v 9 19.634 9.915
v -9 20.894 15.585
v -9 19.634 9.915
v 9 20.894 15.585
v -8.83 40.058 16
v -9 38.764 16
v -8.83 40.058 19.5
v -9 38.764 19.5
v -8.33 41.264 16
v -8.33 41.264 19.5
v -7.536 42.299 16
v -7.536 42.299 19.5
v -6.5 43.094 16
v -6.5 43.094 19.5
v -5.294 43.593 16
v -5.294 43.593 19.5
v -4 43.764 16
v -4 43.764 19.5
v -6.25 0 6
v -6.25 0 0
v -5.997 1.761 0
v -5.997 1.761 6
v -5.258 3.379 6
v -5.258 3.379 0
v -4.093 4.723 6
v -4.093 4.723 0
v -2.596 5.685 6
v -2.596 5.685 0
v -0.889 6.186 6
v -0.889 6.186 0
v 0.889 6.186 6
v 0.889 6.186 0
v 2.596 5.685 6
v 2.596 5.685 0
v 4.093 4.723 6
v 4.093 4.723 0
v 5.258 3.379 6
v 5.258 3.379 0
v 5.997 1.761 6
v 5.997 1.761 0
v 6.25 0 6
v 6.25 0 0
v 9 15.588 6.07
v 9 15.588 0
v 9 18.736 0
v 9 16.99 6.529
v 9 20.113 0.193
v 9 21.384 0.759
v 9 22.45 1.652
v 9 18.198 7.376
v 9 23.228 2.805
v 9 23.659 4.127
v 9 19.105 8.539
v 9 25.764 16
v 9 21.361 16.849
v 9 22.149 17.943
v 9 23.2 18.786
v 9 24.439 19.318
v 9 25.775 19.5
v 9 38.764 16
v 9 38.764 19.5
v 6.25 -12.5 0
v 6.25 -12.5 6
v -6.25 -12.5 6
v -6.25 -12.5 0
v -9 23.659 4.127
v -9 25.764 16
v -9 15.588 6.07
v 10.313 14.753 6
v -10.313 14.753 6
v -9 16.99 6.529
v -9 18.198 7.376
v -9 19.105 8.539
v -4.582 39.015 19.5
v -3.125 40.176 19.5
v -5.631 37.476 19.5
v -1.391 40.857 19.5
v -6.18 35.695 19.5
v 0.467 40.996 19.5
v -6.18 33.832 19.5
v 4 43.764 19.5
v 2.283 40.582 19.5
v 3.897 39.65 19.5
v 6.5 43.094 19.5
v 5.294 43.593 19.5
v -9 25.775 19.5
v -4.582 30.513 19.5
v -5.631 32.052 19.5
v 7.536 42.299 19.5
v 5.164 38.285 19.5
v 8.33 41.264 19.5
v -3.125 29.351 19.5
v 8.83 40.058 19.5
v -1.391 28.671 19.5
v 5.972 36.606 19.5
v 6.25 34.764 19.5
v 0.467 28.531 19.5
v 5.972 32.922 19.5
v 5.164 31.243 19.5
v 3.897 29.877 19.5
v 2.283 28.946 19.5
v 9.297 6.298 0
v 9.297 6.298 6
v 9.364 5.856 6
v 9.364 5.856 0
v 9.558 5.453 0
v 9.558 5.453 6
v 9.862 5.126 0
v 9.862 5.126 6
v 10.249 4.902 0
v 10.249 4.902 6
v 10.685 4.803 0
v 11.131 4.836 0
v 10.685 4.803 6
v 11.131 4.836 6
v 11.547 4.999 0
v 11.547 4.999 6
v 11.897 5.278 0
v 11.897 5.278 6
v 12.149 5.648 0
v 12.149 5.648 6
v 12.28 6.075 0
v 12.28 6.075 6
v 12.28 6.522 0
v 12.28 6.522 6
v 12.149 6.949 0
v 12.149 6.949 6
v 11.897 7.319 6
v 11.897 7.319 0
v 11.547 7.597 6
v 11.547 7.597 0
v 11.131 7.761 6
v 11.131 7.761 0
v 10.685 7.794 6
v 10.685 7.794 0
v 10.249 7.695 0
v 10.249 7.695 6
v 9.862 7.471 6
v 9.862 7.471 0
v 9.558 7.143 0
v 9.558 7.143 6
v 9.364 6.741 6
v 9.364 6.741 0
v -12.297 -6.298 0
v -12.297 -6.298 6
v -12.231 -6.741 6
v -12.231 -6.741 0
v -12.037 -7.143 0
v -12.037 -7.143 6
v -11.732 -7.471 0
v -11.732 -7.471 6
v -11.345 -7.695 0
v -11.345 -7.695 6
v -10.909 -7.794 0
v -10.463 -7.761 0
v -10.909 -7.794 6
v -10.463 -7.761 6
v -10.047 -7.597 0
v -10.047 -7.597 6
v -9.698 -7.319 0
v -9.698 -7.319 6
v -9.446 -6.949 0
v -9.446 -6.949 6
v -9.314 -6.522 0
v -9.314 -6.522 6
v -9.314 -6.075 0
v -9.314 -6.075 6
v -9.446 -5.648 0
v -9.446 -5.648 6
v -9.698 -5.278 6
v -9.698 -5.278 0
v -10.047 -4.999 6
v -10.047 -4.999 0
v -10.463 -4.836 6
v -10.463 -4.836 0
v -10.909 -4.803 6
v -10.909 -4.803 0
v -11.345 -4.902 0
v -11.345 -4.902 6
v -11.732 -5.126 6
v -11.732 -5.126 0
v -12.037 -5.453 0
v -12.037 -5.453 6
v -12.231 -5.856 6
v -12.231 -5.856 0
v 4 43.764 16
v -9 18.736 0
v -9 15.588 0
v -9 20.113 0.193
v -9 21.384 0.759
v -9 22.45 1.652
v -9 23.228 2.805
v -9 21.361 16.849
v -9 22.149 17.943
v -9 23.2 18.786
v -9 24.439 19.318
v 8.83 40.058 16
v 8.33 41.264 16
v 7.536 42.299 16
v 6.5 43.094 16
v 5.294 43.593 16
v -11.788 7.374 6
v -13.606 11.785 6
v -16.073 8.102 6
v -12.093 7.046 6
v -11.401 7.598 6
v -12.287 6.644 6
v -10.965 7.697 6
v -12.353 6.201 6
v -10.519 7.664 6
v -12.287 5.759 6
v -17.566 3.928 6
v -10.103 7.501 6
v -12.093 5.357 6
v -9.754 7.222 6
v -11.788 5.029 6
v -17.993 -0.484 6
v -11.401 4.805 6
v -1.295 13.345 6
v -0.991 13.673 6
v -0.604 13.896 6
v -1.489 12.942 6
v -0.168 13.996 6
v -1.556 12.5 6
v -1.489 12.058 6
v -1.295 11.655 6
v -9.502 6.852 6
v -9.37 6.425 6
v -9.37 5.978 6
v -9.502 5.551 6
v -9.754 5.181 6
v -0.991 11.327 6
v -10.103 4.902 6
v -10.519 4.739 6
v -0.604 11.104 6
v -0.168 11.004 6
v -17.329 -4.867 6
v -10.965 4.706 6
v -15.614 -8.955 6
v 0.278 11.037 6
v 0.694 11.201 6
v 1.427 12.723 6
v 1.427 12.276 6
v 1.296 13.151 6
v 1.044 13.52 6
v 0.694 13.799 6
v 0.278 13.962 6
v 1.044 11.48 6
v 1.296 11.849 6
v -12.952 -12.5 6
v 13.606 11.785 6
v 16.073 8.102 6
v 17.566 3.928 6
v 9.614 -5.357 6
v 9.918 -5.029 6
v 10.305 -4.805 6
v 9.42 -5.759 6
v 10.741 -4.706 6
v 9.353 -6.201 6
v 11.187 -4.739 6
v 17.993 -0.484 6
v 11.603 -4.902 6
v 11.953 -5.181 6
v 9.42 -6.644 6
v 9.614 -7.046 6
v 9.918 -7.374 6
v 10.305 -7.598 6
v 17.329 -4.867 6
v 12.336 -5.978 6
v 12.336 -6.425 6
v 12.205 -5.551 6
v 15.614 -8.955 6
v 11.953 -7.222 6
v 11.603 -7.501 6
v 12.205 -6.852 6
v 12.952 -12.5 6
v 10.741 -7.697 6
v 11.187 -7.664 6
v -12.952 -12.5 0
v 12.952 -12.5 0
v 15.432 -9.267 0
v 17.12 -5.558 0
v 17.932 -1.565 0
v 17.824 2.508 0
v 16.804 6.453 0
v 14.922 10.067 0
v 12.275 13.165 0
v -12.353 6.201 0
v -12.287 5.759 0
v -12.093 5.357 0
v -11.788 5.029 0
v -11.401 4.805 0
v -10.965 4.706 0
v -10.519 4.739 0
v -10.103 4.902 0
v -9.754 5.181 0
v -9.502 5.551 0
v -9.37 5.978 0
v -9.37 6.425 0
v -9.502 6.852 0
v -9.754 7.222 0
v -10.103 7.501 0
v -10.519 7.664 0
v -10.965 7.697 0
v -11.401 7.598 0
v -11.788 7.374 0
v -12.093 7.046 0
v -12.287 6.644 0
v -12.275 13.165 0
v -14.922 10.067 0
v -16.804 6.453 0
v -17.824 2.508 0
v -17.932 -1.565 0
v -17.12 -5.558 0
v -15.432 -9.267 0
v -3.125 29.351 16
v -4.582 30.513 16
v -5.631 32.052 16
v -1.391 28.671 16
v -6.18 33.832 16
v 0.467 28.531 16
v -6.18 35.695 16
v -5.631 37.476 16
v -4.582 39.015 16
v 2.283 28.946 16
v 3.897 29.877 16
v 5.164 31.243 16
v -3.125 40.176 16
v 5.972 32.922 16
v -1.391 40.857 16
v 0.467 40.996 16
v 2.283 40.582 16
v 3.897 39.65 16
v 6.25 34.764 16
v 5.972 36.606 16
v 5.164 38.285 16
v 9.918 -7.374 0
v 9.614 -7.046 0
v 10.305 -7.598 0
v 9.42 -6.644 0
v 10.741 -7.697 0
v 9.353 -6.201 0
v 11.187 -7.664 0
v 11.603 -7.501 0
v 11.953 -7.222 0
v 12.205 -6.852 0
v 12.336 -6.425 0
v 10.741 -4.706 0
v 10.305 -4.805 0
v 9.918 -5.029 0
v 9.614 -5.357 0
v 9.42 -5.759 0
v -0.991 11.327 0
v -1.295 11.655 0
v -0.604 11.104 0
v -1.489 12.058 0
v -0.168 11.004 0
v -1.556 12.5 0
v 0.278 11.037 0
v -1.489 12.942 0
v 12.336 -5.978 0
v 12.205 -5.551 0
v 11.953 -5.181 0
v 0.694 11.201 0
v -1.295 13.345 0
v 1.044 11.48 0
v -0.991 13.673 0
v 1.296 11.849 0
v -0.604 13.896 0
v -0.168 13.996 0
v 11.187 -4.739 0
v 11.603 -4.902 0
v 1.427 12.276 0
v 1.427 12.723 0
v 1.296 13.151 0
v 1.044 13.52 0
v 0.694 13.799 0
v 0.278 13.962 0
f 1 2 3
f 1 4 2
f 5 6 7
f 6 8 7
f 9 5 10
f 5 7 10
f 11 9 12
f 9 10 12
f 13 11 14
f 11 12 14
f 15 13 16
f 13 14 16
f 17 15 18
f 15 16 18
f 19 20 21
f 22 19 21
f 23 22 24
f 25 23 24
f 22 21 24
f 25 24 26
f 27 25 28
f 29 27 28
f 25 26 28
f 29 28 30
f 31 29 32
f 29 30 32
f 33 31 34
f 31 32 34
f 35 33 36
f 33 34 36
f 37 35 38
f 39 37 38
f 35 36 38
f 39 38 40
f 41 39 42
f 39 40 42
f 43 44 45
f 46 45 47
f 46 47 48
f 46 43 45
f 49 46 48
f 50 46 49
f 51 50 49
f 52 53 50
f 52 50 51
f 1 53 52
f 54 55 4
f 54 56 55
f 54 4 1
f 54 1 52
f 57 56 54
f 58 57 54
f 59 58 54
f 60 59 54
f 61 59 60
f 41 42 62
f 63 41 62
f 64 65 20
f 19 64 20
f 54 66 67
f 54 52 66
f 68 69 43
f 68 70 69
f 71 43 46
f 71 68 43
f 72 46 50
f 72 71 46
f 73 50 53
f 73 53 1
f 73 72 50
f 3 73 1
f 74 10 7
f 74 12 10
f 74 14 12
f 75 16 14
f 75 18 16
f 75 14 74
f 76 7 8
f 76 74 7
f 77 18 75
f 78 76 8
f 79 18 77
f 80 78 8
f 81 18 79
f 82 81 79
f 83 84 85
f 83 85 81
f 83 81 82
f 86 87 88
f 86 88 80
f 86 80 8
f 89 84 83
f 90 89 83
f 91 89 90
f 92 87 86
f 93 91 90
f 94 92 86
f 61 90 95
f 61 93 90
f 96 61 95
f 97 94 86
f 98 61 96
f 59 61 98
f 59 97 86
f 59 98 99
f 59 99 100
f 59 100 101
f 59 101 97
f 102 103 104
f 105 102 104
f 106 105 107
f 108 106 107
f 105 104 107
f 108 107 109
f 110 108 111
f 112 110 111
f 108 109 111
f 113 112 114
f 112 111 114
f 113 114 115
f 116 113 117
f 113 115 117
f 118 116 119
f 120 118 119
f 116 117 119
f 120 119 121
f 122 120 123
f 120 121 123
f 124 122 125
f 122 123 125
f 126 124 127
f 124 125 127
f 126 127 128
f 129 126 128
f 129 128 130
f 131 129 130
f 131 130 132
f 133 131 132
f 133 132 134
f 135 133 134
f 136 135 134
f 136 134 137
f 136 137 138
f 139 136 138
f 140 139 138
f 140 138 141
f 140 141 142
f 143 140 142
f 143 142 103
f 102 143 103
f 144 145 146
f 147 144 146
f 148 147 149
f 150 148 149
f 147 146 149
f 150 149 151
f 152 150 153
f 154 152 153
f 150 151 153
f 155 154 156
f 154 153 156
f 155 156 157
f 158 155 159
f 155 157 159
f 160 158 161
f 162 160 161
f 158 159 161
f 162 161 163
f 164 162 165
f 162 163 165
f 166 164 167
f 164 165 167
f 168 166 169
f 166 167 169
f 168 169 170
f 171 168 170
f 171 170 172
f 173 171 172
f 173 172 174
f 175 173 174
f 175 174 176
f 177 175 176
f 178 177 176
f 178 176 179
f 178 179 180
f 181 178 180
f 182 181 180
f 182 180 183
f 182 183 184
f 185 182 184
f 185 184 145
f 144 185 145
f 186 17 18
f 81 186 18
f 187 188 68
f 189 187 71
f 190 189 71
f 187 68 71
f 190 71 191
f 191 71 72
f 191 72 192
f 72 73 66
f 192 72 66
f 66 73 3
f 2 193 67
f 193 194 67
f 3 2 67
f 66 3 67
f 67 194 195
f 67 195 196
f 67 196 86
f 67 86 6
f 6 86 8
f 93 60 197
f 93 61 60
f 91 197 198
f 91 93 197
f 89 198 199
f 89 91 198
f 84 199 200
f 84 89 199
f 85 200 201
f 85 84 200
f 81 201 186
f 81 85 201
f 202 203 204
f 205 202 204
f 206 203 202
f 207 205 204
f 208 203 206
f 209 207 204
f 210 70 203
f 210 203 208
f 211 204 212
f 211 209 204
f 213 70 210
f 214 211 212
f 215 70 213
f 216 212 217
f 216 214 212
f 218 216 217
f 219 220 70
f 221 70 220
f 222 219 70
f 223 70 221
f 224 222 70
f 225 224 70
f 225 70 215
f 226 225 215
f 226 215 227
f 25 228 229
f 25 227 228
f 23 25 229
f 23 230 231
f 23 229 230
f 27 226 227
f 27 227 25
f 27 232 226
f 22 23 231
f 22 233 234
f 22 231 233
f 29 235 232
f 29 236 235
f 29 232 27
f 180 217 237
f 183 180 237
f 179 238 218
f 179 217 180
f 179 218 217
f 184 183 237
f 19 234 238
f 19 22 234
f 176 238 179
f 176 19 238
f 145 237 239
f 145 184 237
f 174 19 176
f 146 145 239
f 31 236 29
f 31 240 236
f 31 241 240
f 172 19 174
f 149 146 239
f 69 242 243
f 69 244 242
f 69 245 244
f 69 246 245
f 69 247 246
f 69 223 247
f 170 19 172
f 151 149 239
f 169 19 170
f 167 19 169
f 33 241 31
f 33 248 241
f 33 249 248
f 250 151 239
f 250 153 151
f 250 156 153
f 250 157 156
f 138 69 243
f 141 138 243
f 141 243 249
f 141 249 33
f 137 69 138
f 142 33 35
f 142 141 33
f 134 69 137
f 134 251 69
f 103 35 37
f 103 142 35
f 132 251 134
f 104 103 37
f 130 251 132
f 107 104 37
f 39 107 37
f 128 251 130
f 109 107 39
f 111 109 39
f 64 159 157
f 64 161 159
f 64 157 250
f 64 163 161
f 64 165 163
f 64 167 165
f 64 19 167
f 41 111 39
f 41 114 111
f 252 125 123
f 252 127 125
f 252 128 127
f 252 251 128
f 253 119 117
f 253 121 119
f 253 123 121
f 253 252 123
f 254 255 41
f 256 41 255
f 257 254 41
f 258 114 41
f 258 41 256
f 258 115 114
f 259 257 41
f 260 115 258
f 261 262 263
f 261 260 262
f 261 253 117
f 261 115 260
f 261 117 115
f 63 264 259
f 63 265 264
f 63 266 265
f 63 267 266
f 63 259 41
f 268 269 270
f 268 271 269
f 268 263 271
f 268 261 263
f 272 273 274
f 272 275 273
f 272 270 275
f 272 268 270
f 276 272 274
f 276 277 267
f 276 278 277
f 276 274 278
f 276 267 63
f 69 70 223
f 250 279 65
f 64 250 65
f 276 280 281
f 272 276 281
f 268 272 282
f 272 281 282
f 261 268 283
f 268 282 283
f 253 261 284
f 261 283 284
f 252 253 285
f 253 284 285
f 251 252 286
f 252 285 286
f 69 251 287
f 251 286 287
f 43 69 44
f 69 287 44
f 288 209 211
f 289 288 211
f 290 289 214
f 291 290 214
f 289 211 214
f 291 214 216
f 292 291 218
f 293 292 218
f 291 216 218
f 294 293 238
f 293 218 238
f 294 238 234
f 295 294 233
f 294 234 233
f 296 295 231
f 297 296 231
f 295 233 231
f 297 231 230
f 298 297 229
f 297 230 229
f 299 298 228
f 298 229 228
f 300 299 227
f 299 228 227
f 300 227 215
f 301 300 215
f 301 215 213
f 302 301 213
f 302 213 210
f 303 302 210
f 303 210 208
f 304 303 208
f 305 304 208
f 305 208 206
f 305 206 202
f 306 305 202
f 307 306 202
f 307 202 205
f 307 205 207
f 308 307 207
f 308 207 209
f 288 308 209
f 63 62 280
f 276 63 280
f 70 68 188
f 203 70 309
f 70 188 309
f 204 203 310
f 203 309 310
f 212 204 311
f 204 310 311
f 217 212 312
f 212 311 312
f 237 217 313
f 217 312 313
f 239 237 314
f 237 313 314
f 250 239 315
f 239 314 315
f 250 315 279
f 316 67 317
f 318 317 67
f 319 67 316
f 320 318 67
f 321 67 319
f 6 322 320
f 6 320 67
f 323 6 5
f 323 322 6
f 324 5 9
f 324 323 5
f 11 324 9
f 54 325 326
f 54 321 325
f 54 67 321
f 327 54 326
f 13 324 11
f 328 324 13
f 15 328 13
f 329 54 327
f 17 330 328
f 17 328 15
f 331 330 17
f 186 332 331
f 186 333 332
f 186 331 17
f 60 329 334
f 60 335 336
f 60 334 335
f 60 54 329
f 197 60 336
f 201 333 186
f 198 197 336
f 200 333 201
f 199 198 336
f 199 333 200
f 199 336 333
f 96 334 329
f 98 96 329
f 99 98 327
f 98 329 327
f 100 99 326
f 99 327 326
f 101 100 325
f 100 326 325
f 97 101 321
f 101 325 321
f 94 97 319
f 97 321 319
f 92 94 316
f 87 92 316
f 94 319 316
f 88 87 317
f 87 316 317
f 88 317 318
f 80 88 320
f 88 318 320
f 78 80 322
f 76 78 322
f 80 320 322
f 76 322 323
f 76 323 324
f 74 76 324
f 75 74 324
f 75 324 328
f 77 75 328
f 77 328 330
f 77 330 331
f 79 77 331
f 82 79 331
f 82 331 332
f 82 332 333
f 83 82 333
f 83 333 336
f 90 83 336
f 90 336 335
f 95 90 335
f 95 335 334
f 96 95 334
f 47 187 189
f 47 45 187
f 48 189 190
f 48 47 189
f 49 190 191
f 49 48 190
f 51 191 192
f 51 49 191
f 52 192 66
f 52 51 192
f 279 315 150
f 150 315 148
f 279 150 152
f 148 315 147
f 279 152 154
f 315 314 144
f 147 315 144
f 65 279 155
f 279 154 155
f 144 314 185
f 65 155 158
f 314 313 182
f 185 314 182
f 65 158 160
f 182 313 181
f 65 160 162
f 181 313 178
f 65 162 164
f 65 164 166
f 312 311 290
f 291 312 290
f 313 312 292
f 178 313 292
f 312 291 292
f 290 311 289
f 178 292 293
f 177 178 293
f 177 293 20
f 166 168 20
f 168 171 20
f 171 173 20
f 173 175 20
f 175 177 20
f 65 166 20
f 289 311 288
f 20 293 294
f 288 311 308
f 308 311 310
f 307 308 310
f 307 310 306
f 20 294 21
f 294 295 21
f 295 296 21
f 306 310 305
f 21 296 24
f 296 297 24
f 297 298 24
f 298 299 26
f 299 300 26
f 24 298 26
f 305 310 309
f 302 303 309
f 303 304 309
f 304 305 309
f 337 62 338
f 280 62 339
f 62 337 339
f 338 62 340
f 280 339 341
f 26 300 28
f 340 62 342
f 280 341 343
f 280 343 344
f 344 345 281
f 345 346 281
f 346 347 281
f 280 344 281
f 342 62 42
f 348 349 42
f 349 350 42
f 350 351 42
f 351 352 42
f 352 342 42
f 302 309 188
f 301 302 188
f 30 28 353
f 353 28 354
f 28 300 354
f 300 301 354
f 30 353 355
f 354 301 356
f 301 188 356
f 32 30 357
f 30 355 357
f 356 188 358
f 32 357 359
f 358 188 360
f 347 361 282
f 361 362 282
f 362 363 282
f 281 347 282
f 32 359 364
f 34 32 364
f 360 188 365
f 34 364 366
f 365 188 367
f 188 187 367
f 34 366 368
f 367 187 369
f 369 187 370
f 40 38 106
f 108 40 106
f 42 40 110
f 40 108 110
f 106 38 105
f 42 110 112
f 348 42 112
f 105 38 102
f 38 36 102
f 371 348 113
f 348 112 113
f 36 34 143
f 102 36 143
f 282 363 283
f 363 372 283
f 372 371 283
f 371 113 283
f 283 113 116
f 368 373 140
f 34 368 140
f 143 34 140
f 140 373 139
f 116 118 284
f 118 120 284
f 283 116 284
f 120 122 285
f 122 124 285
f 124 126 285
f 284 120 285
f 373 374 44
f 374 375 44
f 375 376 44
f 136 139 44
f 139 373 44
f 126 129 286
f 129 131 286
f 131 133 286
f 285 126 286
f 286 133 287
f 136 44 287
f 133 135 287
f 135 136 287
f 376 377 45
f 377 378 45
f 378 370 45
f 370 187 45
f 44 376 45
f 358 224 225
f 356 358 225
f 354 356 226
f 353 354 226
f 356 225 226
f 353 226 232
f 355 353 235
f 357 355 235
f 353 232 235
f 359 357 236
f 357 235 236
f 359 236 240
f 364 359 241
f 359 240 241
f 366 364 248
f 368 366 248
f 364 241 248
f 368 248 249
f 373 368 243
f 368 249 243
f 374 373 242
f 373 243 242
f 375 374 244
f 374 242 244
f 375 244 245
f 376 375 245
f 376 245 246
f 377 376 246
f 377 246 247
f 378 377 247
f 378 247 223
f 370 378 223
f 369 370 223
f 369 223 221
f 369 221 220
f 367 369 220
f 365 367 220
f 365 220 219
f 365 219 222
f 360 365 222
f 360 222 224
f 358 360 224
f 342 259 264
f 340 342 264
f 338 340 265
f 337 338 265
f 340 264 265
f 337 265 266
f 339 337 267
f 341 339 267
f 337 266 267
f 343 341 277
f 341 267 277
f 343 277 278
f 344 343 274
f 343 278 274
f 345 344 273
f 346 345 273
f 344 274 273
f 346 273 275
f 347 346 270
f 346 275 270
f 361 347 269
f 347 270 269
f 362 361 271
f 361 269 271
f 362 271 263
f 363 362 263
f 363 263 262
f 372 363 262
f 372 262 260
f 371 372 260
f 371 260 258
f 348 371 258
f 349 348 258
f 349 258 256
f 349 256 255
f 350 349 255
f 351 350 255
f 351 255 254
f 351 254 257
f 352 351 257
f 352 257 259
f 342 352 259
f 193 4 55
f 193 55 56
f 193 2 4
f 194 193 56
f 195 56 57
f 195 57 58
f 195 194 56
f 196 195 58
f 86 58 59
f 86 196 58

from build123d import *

# Parameters (mm, degrees)
F1_DEPTH      = 6
F3_DEPTH      = 9
F3_DEPTH_BACK = 9
F4_R          = 6.25
F5_DEPTH      = 25
F6_D          = 3
F7_R          = 5


with BuildPart() as f1:
    # F0 (on Top) → F1 (new body)
    with BuildSketch(Plane.XY):
        with BuildLine():
            Line((6.25, -12.4998748011), (12.9519546771, -12.4998748011))
            ThreePointArc((12.9519546771, -12.4998748011), (0, 18), (-12.9519546771, -12.4998748011))
            Line((-12.9519546771, -12.4998748011), (-6.25, -12.4998748011))
            Line((-6.25, -12.4998748011), (-6.25, 0))
            ThreePointArc((-6.25, 0), (0, 6.25), (6.25, 0))
            Line((6.25, 0), (6.25, -12.4998748011))
        make_face()
    extrude(amount=F1_DEPTH)

    # F2 (on Right) → F3 (join, two sides)
    with BuildSketch(Plane.YZ) as f3_sk:
        Polygon((11.0055337464, 0), (22.9271929711, 0), (25.7638388276, 16), (43.7638388276, 16), (43.7638388276, 19.5), (21.7638388276, 19.5), (18.7638388276, 6), (11.0055337464, 6), align=None)
    extrude(amount=F3_DEPTH)
    extrude(f3_sk.sketch, amount=-F3_DEPTH_BACK)

    # F4 (on face) → F5 (cut)
    with BuildSketch(Plane(origin=(0, 0, 16), x_dir=(1, 0, 0), z_dir=(0, 0, -1))):
        with Locations((0, -34.7638388276)):
            Circle(F4_R)
    extrude(amount=-F5_DEPTH, mode=Mode.SUBTRACT)

    # F6 (through all)
    with Locations(Plane(origin=(0, 0, 0), x_dir=(1, 0, 0), z_dir=(0, 0, -1))):
        with Locations((10.7972361083, -6.2983880813), (10.8531821354, 6.2014867198), (-0.0559460271, -12.4998748011), (-10.8531821354, -6.2014867198), (-10.7972361083, 6.2983880813)):
            Hole(F6_D / 2)

    # F7
    f7_edges = [f1.edges().sort_by_distance(p)[0] for p in [
        (0, 18.763839, 6),
        (0, 21.763839, 19.5),
        (0, 22.927193, 0),
        (-9, 43.763839, 17.75),
        (9, 43.763839, 17.75),
    ]]
    fillet(f7_edges, radius=F7_R)


solid = f1.part
